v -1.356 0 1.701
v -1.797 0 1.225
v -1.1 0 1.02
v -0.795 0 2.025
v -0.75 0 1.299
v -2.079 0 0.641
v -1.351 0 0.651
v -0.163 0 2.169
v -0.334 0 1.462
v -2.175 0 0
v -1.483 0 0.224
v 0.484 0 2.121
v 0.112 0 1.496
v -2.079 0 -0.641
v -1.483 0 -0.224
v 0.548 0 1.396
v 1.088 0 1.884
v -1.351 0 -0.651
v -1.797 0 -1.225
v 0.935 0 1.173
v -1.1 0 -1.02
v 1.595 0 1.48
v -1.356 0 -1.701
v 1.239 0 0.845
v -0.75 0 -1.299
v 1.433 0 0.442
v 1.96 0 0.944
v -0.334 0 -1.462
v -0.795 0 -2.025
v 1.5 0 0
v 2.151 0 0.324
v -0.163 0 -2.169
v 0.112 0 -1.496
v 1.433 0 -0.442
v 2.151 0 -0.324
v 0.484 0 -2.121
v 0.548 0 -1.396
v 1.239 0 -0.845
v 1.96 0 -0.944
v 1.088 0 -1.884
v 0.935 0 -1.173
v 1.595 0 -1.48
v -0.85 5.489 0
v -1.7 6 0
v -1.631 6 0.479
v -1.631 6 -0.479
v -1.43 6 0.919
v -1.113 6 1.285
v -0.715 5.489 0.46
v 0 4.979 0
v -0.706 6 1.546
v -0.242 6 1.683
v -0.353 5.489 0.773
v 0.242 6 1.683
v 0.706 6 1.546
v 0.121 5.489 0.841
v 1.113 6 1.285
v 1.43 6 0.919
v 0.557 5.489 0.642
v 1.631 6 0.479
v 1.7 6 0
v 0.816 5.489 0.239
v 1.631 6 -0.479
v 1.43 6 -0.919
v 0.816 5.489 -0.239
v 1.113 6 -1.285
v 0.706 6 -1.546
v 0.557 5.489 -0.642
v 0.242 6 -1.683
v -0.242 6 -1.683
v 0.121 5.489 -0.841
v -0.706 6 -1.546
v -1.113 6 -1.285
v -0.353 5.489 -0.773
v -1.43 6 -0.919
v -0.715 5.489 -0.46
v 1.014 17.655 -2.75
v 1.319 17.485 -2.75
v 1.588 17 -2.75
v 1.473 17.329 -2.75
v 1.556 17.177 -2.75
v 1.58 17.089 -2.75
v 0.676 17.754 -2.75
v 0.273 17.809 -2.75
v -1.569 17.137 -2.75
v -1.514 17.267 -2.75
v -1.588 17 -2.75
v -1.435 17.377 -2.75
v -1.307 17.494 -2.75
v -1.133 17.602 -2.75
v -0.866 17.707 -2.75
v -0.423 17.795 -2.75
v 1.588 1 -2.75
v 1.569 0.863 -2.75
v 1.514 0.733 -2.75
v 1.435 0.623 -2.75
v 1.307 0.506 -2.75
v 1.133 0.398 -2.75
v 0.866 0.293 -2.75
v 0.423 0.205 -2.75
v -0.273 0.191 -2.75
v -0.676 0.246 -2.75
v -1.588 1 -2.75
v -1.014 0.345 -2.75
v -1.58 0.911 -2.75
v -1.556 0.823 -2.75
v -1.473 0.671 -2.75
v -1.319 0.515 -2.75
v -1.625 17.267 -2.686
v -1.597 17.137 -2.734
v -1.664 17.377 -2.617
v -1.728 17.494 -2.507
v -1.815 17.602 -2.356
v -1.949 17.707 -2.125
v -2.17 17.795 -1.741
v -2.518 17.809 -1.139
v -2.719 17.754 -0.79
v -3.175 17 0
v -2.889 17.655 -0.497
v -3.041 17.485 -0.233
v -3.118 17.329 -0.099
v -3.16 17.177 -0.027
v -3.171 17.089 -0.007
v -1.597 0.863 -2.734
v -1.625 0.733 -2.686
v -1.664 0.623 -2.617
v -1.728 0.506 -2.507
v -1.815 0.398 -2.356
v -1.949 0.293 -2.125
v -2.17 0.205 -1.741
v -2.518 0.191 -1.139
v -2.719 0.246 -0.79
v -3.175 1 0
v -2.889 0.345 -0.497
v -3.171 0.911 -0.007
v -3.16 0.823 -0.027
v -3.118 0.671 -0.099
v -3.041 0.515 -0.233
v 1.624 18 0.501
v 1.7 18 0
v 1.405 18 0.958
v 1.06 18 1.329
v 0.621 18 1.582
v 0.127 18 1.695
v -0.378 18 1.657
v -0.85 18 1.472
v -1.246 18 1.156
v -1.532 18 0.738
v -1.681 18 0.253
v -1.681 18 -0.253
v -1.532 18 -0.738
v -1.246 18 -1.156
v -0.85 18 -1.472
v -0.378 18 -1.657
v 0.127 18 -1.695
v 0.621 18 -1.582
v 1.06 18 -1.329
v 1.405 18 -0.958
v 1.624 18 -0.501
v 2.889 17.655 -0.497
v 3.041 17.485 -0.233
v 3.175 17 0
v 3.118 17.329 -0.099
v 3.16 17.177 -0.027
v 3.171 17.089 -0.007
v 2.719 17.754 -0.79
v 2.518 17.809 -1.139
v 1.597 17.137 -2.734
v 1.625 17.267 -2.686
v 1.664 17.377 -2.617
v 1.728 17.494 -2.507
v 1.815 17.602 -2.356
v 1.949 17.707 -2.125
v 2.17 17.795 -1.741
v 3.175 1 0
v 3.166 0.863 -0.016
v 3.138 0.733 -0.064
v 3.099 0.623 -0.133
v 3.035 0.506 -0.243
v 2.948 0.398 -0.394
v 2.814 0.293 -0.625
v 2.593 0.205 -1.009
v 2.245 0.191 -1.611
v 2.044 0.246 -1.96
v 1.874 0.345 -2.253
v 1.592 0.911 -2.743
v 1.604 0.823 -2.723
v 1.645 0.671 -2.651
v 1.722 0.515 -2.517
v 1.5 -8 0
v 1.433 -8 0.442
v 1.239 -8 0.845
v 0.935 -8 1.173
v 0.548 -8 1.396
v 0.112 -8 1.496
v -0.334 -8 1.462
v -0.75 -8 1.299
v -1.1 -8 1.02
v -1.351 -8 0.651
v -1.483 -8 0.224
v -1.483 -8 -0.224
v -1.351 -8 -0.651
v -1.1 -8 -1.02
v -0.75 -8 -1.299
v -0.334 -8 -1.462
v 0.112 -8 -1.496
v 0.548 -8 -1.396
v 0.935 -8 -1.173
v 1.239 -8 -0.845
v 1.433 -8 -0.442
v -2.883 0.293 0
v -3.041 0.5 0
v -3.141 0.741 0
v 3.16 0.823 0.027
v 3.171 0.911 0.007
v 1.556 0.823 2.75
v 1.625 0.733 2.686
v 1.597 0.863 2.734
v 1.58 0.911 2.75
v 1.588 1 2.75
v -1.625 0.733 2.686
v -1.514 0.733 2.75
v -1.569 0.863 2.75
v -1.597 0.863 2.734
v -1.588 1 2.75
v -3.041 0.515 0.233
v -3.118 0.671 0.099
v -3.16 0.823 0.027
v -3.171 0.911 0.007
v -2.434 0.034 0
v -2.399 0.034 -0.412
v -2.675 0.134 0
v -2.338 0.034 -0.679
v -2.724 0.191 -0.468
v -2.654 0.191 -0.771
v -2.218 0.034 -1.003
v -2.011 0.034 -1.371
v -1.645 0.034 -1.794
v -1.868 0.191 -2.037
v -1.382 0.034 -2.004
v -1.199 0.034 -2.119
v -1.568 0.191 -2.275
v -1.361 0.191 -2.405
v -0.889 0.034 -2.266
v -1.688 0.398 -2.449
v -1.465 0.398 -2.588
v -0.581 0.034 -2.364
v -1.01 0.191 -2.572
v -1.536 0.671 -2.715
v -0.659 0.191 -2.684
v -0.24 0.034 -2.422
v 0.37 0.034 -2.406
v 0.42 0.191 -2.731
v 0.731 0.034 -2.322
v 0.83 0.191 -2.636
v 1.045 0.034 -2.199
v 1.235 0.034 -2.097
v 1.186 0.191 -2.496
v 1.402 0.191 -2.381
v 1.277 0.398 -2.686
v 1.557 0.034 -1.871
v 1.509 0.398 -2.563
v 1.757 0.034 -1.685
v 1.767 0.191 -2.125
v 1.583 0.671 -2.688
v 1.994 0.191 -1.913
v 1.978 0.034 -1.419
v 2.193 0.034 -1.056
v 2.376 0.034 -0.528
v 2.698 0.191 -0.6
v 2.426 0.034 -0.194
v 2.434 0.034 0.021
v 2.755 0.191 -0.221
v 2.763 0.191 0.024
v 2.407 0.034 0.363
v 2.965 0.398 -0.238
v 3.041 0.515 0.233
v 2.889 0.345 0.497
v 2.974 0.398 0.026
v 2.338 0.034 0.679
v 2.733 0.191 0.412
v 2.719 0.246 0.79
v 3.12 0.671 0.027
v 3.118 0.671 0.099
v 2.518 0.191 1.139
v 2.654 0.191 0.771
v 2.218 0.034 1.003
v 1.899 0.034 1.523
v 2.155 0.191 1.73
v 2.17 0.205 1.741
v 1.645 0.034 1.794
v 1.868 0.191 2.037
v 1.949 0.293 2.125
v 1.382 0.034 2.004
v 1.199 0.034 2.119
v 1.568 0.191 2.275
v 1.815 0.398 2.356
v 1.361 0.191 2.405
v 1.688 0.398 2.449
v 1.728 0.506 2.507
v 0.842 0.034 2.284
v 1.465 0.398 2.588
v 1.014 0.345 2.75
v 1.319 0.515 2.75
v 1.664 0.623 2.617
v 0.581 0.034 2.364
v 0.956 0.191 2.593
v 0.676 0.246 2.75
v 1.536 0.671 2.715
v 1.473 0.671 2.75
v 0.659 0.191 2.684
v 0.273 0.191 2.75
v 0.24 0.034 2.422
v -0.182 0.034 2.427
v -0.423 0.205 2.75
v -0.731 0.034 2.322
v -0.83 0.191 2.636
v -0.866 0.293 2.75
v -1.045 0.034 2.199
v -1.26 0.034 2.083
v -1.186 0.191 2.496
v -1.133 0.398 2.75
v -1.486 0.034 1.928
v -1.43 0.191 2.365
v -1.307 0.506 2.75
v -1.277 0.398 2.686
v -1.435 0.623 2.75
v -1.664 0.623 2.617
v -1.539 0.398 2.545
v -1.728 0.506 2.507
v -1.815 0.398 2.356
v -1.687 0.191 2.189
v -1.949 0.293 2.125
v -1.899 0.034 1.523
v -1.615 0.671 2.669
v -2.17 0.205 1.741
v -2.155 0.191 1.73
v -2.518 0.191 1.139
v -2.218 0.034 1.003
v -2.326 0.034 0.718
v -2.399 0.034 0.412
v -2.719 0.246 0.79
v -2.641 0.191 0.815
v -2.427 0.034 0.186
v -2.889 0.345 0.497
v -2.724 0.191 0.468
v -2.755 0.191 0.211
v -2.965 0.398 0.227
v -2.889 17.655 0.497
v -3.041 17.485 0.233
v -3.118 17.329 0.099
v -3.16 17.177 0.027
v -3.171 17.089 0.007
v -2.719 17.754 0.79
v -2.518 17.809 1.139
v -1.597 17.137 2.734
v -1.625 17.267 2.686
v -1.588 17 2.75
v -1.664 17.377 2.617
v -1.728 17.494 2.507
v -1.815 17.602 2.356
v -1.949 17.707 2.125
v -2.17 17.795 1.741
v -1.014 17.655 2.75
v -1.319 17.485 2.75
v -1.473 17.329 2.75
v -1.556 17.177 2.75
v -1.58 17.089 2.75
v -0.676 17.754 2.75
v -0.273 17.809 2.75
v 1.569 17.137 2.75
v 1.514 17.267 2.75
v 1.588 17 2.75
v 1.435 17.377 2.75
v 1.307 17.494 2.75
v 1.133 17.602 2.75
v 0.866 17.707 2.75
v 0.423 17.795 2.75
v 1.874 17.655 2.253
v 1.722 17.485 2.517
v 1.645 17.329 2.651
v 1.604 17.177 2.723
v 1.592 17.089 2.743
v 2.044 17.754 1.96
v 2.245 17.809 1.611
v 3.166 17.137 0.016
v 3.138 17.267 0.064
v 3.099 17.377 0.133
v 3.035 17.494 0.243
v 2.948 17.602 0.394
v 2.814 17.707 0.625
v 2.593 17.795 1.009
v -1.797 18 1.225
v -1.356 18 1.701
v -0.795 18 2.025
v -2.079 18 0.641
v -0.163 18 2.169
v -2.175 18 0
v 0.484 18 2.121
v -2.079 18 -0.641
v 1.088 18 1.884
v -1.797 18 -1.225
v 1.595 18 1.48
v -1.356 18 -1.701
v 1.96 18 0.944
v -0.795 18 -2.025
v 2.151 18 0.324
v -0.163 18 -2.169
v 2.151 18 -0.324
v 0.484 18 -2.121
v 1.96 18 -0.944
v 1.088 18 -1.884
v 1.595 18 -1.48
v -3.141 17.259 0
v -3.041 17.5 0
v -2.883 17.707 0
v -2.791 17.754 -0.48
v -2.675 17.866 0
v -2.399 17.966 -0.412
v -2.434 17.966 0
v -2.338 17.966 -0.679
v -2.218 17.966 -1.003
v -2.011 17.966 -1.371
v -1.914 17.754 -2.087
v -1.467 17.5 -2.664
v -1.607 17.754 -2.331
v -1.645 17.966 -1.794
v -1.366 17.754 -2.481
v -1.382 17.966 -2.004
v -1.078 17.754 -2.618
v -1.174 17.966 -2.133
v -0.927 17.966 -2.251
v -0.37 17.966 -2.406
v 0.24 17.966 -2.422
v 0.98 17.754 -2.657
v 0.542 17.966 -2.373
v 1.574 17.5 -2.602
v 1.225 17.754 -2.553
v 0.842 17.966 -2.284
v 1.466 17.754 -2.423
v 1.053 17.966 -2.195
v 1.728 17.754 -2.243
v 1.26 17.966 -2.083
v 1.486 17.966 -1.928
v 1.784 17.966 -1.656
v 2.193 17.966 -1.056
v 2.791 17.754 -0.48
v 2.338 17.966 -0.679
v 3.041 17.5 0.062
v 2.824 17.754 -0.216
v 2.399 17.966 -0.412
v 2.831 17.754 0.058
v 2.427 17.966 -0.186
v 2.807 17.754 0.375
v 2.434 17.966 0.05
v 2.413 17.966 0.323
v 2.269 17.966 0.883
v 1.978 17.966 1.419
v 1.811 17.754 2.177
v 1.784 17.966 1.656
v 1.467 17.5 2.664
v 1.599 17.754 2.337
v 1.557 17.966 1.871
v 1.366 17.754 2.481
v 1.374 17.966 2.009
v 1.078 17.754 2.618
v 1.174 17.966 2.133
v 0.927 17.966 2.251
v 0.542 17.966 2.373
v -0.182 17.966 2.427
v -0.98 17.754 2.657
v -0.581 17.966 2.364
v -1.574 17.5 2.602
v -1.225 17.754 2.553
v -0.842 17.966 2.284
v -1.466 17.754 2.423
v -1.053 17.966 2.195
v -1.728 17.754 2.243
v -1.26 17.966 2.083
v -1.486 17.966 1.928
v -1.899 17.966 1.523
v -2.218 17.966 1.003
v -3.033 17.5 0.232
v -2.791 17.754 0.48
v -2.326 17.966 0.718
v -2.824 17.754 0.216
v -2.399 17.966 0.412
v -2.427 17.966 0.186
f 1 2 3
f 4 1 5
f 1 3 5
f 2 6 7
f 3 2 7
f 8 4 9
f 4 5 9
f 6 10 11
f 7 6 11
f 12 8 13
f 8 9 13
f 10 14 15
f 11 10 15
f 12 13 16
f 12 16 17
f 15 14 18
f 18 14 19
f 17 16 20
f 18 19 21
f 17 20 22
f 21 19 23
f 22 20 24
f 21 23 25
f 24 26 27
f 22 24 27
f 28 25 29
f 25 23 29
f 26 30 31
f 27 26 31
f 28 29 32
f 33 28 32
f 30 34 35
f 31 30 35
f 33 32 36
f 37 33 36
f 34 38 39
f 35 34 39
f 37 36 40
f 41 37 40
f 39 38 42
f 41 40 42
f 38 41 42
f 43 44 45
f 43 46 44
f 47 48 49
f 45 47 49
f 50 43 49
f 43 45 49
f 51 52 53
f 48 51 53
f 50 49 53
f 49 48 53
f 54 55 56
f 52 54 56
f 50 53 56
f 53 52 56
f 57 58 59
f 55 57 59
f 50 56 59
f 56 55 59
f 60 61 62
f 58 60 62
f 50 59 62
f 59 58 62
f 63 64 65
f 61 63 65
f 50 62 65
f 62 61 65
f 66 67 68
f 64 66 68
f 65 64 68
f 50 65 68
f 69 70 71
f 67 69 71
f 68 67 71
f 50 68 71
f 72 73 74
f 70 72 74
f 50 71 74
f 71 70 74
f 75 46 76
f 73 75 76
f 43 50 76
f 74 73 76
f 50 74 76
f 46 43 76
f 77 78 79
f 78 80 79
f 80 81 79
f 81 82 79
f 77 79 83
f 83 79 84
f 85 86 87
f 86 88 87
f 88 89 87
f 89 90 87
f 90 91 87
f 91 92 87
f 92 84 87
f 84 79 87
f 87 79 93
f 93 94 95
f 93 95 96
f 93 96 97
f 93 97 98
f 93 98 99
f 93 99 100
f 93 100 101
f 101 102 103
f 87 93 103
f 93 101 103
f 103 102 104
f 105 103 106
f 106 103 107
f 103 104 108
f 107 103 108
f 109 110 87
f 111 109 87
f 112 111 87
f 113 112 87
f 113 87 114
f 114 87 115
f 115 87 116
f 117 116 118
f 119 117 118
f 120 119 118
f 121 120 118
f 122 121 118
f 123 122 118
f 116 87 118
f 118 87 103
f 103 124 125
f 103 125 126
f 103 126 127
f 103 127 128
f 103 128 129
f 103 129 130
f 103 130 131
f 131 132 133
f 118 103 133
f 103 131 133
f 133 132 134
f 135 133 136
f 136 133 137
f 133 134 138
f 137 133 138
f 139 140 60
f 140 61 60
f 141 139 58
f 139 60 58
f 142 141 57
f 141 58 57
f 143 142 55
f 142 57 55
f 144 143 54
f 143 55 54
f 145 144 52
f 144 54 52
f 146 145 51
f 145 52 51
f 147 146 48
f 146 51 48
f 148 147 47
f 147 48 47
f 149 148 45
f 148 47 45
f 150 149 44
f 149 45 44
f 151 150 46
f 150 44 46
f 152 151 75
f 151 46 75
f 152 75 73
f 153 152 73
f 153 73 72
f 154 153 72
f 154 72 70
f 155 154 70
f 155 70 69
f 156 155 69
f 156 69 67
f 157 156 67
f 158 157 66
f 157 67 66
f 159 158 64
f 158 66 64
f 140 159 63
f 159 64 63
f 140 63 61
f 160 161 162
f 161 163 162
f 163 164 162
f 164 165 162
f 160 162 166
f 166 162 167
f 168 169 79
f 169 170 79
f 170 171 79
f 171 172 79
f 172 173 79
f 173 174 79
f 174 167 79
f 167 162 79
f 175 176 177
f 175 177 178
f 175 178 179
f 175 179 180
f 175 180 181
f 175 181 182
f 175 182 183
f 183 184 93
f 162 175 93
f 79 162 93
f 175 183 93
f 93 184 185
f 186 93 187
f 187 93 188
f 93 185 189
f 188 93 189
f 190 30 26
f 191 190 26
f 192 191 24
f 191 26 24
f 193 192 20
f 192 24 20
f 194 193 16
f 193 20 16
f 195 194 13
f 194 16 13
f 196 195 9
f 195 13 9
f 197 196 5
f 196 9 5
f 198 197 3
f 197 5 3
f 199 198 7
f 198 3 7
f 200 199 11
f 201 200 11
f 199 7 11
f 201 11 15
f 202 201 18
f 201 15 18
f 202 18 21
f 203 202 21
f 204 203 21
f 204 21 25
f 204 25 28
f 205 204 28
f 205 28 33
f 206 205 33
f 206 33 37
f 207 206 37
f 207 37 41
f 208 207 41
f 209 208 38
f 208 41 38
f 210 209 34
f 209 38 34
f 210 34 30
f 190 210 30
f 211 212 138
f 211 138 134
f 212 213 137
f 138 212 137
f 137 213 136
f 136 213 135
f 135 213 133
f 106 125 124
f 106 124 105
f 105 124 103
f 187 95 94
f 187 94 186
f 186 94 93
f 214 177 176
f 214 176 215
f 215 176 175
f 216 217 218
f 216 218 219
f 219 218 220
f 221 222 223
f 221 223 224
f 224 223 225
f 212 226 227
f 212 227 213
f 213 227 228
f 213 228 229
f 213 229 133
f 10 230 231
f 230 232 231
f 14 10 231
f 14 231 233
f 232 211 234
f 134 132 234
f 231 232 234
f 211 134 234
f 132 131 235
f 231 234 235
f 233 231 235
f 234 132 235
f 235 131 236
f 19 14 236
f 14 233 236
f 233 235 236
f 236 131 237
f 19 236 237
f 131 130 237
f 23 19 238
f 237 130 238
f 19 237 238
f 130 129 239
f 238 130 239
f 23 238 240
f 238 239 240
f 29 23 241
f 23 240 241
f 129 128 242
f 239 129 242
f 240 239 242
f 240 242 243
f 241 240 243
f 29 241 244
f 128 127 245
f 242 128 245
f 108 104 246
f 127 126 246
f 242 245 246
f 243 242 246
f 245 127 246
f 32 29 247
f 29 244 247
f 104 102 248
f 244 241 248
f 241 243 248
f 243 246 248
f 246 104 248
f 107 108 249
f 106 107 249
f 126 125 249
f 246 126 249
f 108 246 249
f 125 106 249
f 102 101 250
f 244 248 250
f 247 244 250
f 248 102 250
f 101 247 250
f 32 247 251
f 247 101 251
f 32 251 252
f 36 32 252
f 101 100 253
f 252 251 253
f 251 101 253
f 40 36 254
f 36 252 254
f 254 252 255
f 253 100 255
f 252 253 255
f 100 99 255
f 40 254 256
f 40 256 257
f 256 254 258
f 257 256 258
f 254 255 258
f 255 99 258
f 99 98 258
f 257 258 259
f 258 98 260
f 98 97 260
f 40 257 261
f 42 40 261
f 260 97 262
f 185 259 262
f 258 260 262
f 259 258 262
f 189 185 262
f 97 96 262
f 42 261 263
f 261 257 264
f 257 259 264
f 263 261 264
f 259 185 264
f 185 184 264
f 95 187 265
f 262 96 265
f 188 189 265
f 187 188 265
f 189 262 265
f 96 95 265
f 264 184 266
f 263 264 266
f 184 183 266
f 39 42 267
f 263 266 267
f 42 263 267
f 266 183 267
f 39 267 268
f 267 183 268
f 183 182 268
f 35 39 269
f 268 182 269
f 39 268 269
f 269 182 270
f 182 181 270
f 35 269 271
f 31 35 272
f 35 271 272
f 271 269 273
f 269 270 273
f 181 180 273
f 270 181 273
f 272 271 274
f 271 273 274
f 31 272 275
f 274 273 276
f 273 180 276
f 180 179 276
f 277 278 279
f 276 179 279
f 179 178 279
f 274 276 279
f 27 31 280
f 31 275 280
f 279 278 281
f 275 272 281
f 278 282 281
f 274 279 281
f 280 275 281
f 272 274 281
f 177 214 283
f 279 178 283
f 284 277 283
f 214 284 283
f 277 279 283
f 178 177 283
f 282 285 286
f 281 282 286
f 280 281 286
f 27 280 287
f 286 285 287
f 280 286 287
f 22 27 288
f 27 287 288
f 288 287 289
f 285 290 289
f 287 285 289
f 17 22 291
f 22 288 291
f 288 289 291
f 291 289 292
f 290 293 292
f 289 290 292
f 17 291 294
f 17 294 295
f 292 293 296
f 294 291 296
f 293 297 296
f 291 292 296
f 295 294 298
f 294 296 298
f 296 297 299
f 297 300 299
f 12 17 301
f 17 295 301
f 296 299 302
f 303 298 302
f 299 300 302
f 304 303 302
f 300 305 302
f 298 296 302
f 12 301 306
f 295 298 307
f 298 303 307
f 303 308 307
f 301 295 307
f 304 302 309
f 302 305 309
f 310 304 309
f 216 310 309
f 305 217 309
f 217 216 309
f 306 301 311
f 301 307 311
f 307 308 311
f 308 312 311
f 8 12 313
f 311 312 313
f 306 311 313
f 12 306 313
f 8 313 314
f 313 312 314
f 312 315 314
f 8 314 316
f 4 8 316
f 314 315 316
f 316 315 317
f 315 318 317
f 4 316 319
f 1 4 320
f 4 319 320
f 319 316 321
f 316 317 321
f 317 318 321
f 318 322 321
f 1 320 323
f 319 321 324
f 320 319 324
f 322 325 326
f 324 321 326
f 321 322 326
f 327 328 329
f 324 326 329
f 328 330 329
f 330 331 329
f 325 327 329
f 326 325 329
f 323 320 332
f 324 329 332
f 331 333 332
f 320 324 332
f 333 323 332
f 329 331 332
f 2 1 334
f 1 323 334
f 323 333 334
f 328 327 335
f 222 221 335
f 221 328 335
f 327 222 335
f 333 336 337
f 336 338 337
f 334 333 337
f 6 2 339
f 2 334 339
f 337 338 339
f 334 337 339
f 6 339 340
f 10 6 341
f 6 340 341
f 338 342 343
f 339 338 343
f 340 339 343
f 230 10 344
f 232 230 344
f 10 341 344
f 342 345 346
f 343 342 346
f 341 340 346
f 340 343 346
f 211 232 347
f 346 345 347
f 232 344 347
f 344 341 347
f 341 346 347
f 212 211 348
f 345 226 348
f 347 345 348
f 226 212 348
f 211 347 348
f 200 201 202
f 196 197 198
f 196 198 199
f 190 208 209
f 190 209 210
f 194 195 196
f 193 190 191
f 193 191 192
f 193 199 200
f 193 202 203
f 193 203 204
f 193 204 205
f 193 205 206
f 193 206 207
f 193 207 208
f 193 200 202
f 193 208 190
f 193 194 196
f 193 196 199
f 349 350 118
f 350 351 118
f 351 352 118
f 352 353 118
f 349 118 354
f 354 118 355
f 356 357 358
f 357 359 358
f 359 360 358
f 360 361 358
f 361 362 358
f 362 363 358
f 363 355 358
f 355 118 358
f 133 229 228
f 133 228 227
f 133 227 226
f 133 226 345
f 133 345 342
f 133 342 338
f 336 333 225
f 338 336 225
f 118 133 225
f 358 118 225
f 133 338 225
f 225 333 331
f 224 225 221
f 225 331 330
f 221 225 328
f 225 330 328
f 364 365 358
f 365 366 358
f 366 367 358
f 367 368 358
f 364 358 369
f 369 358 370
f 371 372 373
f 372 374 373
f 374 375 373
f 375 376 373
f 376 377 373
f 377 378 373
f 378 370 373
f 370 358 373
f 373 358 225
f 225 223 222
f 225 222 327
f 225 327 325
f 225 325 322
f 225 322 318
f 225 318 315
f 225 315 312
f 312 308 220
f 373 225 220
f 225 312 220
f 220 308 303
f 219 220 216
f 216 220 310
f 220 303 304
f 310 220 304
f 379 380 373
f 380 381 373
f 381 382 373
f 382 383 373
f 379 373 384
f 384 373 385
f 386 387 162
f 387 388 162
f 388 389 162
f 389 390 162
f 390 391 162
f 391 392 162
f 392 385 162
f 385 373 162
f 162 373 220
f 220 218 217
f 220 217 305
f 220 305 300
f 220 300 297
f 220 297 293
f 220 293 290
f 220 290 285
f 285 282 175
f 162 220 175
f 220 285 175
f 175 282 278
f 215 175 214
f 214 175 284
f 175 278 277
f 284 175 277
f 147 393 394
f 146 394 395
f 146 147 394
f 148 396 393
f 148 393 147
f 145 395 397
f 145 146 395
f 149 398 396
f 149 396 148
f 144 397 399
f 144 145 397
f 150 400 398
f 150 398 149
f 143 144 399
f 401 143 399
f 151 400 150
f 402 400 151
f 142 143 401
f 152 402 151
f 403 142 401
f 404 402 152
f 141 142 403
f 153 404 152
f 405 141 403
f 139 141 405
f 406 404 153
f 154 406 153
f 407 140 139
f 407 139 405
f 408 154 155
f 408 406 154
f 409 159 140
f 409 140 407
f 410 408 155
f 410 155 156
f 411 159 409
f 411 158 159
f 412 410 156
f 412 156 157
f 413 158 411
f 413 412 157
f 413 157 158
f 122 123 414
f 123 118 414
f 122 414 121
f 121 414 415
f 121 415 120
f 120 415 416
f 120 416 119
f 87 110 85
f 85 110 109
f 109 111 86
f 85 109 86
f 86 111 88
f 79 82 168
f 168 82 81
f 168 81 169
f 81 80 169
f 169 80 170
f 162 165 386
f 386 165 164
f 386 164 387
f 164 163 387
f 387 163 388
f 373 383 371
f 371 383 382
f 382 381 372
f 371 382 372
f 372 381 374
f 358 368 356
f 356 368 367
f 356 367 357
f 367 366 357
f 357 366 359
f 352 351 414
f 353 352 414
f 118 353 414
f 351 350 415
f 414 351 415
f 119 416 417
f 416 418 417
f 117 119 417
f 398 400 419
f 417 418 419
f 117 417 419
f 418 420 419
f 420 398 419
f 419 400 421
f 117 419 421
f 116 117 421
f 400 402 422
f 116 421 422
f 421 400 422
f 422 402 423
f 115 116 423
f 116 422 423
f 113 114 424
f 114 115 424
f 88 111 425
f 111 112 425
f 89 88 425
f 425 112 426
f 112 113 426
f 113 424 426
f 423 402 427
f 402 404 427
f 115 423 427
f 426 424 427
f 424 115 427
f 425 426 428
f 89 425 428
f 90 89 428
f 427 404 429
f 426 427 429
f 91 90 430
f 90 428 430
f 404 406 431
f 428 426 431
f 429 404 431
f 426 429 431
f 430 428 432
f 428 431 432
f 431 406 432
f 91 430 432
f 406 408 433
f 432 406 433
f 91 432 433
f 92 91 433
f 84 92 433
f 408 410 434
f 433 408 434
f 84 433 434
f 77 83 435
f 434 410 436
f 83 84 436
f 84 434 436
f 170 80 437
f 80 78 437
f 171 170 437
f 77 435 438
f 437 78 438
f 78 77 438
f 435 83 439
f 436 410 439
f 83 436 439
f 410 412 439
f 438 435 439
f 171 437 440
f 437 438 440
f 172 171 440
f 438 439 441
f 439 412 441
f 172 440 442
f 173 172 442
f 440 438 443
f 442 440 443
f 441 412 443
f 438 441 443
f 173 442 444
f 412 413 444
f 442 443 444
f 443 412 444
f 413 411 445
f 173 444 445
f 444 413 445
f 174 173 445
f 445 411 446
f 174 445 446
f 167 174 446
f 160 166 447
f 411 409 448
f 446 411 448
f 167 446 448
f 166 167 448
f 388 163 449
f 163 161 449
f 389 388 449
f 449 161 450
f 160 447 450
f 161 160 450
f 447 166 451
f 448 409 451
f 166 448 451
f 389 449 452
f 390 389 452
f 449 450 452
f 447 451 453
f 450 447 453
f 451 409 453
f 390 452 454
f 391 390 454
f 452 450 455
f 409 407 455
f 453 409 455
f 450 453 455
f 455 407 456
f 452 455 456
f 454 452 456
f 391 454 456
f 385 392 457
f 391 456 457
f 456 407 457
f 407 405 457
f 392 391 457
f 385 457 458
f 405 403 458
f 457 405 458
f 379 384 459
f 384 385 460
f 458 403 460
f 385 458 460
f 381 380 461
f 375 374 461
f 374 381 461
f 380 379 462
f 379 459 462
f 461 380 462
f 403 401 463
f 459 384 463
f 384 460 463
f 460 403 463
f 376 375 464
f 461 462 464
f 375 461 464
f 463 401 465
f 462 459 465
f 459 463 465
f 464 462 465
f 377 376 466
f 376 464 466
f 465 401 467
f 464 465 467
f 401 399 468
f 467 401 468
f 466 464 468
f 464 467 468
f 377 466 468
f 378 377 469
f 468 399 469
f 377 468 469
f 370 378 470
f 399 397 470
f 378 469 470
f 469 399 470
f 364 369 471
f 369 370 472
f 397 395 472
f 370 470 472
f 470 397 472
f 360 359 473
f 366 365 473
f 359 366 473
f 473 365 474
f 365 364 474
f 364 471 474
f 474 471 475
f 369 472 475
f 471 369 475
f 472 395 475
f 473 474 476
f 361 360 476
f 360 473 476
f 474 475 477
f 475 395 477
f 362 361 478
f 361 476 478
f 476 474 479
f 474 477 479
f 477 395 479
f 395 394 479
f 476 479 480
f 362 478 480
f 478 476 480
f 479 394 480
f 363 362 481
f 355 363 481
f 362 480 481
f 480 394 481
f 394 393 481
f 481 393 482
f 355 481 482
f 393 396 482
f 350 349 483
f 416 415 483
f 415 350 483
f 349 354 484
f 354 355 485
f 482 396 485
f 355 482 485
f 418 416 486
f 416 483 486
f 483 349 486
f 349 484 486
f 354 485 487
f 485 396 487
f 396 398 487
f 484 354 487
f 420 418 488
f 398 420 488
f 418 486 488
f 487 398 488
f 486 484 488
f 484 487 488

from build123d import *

# Parameters (mm, degrees)
BOSS_EXTRUDE1_DEPTH      = 18
M3_CLEARANCE_HOLE1_D     = 3.4
M3_CLEARANCE_HOLE1_DEPTH = 12
M3_CLEARANCE_HOLE1_TIP   = 1.021463052
SKETCH5_R                = 1.5
BOSS_EXTRUDE2_DEPTH      = 8


with BuildPart() as part:
    # Sketch1 → Boss-Extrude1 (new body)
    with BuildSketch(Plane(origin=(0, 0, 0), x_dir=(1, 0, 0), z_dir=(0, 1, 0))):
        Polygon((3.175426481, 0), (1.58771324, 2.75), (-1.58771324, 2.75), (-3.175426481, 0), (-1.58771324, -2.75), (1.58771324, -2.75), align=None)
    extrude(amount=BOSS_EXTRUDE1_DEPTH)

    # M3 Clearance Hole1
    with Locations(Plane(origin=(0, 18, 0), x_dir=(-1, 0, 0), z_dir=(0, 1, 0))):
        with Locations((0, 0)):
            Hole(M3_CLEARANCE_HOLE1_D / 2, depth=M3_CLEARANCE_HOLE1_DEPTH)
            with Locations((0, 0, -(M3_CLEARANCE_HOLE1_DEPTH + M3_CLEARANCE_HOLE1_TIP / 2))):  # 118° drill point
                Cone(0, M3_CLEARANCE_HOLE1_D / 2, M3_CLEARANCE_HOLE1_TIP, mode=Mode.SUBTRACT)

    # Sketch4 → Cut-Revolve1 (revolve, cut)
    with BuildSketch(Plane.XY):
        with BuildLine():
            Line((-2.175426481, 18), (-3.175426481, 18))
            Line((-3.175426481, 18), (-3.175426481, 17))
            ThreePointArc((-3.175426481, 17), (-2.882533262, 17.707106781), (-2.175426481, 18))
        make_face()
        with BuildLine():
            Line((-3.175426481, 1), (-3.175426481, 0))
            Line((-3.175426481, 0), (-2.175426481, 0))
            ThreePointArc((-2.175426481, 0), (-2.882533262, 0.292893219), (-3.175426481, 1))
        make_face()
    revolve(axis=Axis((0, 18, 0), (0, -1, 0)), mode=Mode.SUBTRACT)

    # Sketch5 → Boss-Extrude2 (add)
    with BuildSketch(Plane.XZ):
        Circle(SKETCH5_R)
    extrude(amount=BOSS_EXTRUDE2_DEPTH)


solid = part.part
